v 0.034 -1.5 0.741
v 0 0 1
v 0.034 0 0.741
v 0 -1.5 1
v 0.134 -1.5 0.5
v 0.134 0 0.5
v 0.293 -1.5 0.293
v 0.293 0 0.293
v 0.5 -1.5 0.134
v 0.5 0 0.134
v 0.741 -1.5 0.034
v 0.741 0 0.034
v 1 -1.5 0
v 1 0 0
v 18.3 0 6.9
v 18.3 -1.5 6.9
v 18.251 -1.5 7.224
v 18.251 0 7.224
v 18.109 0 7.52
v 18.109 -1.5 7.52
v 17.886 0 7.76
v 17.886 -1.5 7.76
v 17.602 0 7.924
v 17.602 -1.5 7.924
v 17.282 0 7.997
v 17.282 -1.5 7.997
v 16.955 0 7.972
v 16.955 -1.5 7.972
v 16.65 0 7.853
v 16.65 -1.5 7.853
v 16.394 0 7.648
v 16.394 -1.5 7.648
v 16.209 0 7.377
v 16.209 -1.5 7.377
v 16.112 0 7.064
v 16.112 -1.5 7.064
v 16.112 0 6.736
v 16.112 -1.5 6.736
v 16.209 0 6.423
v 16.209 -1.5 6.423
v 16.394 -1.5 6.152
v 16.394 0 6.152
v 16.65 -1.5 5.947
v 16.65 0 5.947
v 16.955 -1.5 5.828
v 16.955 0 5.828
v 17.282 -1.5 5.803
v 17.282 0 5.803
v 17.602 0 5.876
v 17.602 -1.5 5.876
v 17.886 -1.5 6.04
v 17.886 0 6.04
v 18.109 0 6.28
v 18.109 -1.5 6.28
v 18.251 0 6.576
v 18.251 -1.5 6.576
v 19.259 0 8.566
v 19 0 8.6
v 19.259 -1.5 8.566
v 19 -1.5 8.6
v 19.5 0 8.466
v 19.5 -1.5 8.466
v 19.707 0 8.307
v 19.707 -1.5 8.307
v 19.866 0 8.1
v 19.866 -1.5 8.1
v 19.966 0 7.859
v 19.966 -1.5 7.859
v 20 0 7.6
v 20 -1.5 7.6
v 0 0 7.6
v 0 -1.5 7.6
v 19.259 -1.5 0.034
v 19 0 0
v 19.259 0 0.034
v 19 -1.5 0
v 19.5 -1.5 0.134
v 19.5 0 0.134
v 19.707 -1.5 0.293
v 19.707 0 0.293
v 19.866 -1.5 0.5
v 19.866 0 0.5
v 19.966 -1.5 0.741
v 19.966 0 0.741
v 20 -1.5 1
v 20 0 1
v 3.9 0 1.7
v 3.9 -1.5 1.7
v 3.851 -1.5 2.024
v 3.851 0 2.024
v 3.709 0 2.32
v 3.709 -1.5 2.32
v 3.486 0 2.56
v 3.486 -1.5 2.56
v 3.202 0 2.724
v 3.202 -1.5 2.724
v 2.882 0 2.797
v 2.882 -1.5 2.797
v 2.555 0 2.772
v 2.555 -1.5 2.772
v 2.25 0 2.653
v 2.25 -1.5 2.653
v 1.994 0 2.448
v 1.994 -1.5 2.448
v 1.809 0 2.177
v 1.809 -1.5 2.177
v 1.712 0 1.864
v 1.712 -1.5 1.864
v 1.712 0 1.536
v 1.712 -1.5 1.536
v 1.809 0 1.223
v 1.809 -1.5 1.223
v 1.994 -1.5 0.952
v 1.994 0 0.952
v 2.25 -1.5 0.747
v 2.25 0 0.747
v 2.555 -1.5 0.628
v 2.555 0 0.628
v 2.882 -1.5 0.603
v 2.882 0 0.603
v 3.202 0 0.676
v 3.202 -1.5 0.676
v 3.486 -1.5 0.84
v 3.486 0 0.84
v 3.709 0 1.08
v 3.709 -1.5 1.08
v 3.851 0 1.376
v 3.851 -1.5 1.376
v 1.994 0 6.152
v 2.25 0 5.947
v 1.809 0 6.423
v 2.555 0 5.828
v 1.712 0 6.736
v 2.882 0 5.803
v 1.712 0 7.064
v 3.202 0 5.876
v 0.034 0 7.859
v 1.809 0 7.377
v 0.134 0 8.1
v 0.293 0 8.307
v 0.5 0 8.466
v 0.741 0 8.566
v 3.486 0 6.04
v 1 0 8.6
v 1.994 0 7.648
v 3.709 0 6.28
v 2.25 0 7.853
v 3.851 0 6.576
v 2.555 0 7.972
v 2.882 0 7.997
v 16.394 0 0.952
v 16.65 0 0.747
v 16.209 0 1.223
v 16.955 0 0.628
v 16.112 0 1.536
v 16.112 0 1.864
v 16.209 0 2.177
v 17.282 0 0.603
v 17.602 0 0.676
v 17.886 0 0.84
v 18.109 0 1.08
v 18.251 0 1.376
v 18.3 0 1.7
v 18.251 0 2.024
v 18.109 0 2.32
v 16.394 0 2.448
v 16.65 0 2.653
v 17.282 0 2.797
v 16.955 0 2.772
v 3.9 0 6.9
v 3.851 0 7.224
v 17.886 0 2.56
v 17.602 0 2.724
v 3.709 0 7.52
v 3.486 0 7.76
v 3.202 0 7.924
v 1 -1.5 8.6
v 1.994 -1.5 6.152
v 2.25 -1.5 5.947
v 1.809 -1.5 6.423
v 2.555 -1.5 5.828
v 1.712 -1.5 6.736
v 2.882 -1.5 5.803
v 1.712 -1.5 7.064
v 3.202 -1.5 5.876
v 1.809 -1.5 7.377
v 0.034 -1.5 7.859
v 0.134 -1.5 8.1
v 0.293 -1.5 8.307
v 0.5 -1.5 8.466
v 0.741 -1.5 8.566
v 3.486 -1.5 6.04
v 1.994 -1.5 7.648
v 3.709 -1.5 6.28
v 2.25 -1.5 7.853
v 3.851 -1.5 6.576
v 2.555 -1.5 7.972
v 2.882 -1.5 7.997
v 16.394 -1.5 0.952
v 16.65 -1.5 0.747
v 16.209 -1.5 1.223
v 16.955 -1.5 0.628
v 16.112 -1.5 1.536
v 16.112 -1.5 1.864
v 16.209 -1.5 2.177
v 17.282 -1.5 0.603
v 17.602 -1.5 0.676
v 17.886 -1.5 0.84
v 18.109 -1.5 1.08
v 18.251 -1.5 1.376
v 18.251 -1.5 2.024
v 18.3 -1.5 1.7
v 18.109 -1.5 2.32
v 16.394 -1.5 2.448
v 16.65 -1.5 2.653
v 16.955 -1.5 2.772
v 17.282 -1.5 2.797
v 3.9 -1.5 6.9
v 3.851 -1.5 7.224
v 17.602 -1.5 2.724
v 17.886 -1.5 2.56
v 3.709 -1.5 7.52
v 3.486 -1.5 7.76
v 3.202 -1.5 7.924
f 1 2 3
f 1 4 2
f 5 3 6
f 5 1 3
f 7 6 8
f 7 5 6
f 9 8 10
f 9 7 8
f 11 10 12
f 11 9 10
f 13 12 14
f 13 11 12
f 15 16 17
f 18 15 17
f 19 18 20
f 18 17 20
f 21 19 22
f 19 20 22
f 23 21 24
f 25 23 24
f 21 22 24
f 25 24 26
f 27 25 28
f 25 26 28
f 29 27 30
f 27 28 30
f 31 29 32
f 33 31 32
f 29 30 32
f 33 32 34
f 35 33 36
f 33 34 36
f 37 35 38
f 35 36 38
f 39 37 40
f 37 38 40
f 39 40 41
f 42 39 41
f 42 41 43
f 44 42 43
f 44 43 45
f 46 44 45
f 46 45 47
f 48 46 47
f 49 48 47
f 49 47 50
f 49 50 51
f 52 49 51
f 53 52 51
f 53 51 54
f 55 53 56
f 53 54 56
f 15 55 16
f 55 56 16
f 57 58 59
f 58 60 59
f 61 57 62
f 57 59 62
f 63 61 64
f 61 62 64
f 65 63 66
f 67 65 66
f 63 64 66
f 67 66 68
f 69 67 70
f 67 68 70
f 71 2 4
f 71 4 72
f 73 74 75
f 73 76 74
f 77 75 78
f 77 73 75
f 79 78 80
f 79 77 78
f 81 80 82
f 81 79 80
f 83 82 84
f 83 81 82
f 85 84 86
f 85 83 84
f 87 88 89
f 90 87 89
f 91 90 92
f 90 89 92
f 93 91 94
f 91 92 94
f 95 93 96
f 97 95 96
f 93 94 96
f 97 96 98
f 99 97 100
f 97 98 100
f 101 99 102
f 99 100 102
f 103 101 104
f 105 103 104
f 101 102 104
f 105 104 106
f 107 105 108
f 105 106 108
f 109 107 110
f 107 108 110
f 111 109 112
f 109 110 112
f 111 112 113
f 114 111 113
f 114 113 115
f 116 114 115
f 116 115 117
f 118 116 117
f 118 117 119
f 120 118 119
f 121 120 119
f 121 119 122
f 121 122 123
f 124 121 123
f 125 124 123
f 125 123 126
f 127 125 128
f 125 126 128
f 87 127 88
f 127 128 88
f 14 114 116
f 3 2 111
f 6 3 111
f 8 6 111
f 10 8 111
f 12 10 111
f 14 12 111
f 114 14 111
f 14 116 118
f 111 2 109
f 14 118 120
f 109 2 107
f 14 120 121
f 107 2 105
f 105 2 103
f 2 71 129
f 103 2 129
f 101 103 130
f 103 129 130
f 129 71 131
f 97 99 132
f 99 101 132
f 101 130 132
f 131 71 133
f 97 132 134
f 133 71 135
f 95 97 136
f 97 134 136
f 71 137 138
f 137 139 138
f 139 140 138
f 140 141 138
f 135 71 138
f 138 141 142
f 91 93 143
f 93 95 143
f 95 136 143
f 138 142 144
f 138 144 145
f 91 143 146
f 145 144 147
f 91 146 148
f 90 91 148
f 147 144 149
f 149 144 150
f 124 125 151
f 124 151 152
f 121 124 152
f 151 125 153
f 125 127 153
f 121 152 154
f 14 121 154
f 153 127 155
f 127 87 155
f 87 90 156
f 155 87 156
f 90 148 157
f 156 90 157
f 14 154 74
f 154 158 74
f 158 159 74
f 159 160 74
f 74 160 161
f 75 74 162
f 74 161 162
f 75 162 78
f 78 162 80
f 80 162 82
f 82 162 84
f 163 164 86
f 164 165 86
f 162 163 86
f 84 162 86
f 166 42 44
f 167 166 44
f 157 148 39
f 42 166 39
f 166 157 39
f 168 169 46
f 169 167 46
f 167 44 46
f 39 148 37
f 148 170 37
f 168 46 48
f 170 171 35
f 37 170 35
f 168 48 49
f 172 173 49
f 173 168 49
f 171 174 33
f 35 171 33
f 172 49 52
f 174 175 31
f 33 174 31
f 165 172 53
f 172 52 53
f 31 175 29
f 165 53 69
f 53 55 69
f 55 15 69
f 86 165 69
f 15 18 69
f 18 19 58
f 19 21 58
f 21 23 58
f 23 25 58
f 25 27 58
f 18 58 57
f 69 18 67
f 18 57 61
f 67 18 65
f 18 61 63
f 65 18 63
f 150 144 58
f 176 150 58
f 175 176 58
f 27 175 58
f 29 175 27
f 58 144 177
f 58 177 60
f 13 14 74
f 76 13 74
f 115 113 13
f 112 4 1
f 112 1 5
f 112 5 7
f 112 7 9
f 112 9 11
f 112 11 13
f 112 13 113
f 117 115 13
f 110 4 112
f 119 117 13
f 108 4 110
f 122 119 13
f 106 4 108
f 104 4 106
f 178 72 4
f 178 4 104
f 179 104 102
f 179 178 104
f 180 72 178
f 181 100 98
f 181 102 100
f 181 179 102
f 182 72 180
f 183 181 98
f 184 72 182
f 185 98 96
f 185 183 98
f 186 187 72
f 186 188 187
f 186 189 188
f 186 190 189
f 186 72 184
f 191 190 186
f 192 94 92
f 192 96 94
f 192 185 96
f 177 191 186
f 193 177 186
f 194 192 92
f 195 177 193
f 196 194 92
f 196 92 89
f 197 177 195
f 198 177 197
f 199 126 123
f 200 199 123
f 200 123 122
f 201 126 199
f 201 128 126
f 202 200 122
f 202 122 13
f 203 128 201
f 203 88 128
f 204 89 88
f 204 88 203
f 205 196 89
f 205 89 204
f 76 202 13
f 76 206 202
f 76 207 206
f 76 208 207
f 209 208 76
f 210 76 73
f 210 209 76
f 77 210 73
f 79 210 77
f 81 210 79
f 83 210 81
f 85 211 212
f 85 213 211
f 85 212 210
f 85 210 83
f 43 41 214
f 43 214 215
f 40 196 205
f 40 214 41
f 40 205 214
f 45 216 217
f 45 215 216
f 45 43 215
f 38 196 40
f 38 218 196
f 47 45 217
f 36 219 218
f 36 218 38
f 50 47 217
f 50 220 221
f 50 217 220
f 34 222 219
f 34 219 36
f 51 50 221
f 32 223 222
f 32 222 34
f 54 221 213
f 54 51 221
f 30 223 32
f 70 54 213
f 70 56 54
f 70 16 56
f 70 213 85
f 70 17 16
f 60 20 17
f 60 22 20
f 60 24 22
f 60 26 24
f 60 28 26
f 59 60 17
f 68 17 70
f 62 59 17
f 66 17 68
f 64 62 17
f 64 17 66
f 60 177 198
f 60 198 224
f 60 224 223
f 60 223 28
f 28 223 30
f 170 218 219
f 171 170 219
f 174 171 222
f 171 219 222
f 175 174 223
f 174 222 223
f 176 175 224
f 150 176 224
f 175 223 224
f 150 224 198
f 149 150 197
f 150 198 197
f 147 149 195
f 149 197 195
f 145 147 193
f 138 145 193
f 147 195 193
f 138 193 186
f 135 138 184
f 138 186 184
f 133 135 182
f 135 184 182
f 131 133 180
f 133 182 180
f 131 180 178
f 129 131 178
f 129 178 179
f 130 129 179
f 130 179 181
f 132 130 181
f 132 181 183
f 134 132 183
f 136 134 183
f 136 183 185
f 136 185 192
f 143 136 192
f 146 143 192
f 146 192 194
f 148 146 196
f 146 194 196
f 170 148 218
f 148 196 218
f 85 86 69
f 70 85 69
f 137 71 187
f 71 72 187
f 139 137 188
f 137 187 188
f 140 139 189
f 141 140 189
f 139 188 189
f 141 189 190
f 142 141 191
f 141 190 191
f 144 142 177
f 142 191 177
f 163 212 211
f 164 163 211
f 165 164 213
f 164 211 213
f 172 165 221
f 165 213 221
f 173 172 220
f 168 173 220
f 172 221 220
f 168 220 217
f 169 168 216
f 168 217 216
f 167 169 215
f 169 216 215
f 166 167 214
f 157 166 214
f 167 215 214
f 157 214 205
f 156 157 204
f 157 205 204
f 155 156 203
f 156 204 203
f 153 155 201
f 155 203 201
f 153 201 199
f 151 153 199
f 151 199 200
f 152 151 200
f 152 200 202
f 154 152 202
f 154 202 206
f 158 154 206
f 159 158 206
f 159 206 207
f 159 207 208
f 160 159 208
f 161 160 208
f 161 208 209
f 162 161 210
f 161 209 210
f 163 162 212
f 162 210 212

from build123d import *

# Parameters (mm, degrees)
F0_W     = 20
F0_H     = 8.6
F1_DEPTH = 1.5
F2_R     = 1.1
F3_DEPTH = 1.5
F4_R     = 1


with BuildPart() as f1:
    # F0 (on Front) → F1 (new body)
    with BuildSketch(Plane.XZ):
        with Locations((10, 4.3)):
            Rectangle(F0_W, F0_H)
    extrude(amount=F1_DEPTH)

    # F2 (on face) → F3 (cut, through all)
    with BuildSketch(Plane.XZ.offset(1.5)):
        with Locations((2.8, 6.9)):
            Circle(F2_R)
        with Locations((17.2, 6.9)):
            Circle(F2_R)
        with Locations((2.8, 1.7)):
            Circle(F2_R)
        with Locations((17.2, 1.7)):
            Circle(F2_R)
    extrude(amount=-F3_DEPTH, mode=Mode.SUBTRACT)

    # F4
    f4_edges = [f1.edges().sort_by_distance(p)[0] for p in [
        (20, -0.75, 8.6),
        (20, -0.75, 0),
        (0, -0.75, 8.6),
        (0, -0.75, 0),
    ]]
    fillet(f4_edges, radius=F4_R)


solid = f1.part
